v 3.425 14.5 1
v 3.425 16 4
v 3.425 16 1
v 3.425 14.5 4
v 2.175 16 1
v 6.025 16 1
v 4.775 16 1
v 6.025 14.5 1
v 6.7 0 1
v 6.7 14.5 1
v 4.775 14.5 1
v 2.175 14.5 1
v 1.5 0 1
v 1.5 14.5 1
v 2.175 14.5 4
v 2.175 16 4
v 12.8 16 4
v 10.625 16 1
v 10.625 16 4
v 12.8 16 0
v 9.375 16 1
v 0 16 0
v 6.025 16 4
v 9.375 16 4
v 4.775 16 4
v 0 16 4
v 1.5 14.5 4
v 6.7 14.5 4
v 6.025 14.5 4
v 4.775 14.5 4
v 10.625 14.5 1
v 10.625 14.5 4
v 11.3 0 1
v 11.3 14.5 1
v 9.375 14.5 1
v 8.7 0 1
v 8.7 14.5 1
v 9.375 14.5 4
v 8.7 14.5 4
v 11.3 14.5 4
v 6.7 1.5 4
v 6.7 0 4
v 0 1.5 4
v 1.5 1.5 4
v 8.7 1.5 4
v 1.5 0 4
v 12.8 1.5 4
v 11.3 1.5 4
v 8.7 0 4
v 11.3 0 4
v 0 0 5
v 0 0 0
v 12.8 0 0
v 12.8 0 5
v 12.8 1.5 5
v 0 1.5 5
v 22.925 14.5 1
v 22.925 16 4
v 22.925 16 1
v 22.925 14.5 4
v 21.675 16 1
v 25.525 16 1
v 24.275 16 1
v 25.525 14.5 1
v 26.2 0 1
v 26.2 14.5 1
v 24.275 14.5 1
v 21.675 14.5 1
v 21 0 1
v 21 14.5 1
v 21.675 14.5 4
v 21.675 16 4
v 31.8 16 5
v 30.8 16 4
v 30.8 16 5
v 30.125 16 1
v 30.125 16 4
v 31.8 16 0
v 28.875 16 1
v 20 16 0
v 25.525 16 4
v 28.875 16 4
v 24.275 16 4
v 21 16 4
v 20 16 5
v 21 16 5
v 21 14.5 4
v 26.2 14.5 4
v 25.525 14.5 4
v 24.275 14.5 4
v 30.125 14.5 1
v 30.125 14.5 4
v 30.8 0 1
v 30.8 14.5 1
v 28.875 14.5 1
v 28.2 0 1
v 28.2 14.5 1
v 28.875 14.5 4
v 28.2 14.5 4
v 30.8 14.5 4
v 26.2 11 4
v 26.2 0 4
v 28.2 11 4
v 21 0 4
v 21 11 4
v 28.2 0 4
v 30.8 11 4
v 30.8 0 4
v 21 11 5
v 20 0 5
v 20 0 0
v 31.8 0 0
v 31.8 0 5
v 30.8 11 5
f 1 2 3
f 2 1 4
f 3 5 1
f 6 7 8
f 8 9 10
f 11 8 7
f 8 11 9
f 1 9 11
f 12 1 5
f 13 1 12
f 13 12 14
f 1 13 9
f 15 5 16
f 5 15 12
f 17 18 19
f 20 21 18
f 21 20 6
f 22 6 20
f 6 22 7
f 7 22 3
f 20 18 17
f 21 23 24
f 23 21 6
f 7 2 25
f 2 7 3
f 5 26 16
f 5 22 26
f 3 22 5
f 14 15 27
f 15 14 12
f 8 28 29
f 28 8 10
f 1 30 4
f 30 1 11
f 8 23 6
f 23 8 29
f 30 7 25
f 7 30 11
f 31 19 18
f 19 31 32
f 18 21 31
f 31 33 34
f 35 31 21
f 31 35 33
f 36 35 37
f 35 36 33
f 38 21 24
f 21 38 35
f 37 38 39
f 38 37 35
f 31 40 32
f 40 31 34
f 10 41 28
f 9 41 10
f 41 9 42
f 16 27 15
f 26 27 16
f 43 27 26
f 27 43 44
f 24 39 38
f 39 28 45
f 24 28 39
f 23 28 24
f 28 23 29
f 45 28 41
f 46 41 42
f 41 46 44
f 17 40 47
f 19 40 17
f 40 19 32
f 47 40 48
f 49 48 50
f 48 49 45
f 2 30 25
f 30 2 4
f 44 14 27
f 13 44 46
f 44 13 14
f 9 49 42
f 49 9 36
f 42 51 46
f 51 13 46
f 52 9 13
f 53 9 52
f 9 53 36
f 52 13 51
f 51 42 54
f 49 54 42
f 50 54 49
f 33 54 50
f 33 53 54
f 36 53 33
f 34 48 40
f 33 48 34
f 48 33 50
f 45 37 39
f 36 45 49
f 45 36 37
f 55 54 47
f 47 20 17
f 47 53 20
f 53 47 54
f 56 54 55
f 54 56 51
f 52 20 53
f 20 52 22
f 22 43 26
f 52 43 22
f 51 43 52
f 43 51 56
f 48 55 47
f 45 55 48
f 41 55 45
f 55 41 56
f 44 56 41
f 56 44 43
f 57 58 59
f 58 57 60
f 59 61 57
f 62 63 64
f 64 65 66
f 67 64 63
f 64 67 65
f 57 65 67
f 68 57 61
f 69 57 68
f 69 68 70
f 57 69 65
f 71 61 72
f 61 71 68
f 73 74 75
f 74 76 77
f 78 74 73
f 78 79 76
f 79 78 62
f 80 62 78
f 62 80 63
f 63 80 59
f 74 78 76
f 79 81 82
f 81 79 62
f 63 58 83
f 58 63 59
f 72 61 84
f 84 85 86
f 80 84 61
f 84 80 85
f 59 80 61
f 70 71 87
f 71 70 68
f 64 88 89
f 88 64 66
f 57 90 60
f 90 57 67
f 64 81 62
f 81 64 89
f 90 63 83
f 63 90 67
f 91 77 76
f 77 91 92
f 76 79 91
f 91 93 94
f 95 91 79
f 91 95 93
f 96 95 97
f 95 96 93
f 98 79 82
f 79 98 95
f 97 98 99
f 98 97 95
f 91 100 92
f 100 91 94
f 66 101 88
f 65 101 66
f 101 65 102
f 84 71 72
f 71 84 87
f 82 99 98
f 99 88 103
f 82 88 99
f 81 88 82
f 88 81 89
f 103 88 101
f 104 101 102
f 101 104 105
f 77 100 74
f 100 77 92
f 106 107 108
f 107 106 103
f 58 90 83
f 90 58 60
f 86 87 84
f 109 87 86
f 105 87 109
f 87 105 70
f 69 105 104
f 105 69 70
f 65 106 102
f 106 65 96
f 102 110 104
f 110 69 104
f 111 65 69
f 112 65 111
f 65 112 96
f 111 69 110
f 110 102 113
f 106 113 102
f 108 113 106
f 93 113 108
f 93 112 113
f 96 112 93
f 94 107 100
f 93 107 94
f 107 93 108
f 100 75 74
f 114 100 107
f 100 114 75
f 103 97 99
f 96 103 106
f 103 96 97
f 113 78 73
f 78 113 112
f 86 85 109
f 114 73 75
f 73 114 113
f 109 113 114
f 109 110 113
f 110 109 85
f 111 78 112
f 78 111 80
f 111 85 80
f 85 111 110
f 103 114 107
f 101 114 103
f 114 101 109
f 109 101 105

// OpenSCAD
wallThickness = 1.5;
height = 5;

femaleConnWidth = 2.6;
femaleConnHeight = 3;
femaleConnCableSize = 1.25;
femaleConnLength = 14.5;

rightSideEnsurerWidth = 2;

depth = femaleConnLength + wallThickness;

femalePedalConnector();

translate([20, 0, 0])
malePedalConnector(); 


module femalePedalConnector() {
    width = femaleConnWidth * 3 + wallThickness * 2 + rightSideEnsurerWidth;
    difference() {
       difference() {
            cube([width, depth, height]);

            translate([0, 0, (height - femaleConnHeight)/2]) {

                translate([wallThickness, 0, 0])
                cube([femaleConnWidth * 2, femaleConnLength, femaleConnHeight]);
                translate([wallThickness + femaleConnWidth * 2 + rightSideEnsurerWidth, 0, 0])
                
                cube([femaleConnWidth, femaleConnLength, femaleConnHeight]);
                
                translate([(femaleConnWidth - femaleConnCableSize)/2, femaleConnLength, 0]) {
                    translate([wallThickness, 0, 0])
                    cube([femaleConnCableSize, wallThickness, 10]);
                    translate([wallThickness + femaleConnWidth, 0, 0])                
                    cube([femaleConnCableSize, wallThickness, 10]);
                    
                    translate([wallThickness + femaleConnWidth * 2 + rightSideEnsurerWidth, 0, 0])
                    cube([femaleConnCableSize, wallThickness, 10]);
                }
            }
        }
        translate([0, wallThickness, (height + femaleConnHeight)/2])
        cube([width, depth, height]);
    }
}


module malePedalConnector() {
    padding = 1;
    connMoveDepth = 5;
    difference() {
        difference() {
            cube([
                femaleConnWidth * 3 + rightSideEnsurerWidth + padding * 2, 
                depth, 
                femaleConnHeight + padding * 2
            ]);
            translate([0, 0, padding]) {
                translate([padding, 0, 0])
                cube([femaleConnWidth * 2, femaleConnLength, femaleConnHeight]);
                translate([padding + femaleConnWidth * 2 + rightSideEnsurerWidth, 0, 0])
                
                cube([femaleConnWidth, femaleConnLength, femaleConnHeight]);
                
                translate([(femaleConnWidth - femaleConnCableSize)/2, femaleConnLength, 0]) {
                    translate([padding, 0, 0])
                    cube([femaleConnCableSize, wallThickness, 10]);
                    translate([padding + femaleConnWidth, 0, 0])                
                    cube([femaleConnCableSize, wallThickness, 10]);
                    
                    translate([padding + femaleConnWidth * 2 + rightSideEnsurerWidth, 0, 0])
                    cube([femaleConnCableSize, wallThickness, 10]);
                }
            }
        }
        translate([padding, depth - connMoveDepth, femaleConnHeight + padding])
        cube([
            femaleConnWidth * 3 + rightSideEnsurerWidth,
            connMoveDepth, 
            femaleConnHeight + padding * 2
        ]);
    }
}
